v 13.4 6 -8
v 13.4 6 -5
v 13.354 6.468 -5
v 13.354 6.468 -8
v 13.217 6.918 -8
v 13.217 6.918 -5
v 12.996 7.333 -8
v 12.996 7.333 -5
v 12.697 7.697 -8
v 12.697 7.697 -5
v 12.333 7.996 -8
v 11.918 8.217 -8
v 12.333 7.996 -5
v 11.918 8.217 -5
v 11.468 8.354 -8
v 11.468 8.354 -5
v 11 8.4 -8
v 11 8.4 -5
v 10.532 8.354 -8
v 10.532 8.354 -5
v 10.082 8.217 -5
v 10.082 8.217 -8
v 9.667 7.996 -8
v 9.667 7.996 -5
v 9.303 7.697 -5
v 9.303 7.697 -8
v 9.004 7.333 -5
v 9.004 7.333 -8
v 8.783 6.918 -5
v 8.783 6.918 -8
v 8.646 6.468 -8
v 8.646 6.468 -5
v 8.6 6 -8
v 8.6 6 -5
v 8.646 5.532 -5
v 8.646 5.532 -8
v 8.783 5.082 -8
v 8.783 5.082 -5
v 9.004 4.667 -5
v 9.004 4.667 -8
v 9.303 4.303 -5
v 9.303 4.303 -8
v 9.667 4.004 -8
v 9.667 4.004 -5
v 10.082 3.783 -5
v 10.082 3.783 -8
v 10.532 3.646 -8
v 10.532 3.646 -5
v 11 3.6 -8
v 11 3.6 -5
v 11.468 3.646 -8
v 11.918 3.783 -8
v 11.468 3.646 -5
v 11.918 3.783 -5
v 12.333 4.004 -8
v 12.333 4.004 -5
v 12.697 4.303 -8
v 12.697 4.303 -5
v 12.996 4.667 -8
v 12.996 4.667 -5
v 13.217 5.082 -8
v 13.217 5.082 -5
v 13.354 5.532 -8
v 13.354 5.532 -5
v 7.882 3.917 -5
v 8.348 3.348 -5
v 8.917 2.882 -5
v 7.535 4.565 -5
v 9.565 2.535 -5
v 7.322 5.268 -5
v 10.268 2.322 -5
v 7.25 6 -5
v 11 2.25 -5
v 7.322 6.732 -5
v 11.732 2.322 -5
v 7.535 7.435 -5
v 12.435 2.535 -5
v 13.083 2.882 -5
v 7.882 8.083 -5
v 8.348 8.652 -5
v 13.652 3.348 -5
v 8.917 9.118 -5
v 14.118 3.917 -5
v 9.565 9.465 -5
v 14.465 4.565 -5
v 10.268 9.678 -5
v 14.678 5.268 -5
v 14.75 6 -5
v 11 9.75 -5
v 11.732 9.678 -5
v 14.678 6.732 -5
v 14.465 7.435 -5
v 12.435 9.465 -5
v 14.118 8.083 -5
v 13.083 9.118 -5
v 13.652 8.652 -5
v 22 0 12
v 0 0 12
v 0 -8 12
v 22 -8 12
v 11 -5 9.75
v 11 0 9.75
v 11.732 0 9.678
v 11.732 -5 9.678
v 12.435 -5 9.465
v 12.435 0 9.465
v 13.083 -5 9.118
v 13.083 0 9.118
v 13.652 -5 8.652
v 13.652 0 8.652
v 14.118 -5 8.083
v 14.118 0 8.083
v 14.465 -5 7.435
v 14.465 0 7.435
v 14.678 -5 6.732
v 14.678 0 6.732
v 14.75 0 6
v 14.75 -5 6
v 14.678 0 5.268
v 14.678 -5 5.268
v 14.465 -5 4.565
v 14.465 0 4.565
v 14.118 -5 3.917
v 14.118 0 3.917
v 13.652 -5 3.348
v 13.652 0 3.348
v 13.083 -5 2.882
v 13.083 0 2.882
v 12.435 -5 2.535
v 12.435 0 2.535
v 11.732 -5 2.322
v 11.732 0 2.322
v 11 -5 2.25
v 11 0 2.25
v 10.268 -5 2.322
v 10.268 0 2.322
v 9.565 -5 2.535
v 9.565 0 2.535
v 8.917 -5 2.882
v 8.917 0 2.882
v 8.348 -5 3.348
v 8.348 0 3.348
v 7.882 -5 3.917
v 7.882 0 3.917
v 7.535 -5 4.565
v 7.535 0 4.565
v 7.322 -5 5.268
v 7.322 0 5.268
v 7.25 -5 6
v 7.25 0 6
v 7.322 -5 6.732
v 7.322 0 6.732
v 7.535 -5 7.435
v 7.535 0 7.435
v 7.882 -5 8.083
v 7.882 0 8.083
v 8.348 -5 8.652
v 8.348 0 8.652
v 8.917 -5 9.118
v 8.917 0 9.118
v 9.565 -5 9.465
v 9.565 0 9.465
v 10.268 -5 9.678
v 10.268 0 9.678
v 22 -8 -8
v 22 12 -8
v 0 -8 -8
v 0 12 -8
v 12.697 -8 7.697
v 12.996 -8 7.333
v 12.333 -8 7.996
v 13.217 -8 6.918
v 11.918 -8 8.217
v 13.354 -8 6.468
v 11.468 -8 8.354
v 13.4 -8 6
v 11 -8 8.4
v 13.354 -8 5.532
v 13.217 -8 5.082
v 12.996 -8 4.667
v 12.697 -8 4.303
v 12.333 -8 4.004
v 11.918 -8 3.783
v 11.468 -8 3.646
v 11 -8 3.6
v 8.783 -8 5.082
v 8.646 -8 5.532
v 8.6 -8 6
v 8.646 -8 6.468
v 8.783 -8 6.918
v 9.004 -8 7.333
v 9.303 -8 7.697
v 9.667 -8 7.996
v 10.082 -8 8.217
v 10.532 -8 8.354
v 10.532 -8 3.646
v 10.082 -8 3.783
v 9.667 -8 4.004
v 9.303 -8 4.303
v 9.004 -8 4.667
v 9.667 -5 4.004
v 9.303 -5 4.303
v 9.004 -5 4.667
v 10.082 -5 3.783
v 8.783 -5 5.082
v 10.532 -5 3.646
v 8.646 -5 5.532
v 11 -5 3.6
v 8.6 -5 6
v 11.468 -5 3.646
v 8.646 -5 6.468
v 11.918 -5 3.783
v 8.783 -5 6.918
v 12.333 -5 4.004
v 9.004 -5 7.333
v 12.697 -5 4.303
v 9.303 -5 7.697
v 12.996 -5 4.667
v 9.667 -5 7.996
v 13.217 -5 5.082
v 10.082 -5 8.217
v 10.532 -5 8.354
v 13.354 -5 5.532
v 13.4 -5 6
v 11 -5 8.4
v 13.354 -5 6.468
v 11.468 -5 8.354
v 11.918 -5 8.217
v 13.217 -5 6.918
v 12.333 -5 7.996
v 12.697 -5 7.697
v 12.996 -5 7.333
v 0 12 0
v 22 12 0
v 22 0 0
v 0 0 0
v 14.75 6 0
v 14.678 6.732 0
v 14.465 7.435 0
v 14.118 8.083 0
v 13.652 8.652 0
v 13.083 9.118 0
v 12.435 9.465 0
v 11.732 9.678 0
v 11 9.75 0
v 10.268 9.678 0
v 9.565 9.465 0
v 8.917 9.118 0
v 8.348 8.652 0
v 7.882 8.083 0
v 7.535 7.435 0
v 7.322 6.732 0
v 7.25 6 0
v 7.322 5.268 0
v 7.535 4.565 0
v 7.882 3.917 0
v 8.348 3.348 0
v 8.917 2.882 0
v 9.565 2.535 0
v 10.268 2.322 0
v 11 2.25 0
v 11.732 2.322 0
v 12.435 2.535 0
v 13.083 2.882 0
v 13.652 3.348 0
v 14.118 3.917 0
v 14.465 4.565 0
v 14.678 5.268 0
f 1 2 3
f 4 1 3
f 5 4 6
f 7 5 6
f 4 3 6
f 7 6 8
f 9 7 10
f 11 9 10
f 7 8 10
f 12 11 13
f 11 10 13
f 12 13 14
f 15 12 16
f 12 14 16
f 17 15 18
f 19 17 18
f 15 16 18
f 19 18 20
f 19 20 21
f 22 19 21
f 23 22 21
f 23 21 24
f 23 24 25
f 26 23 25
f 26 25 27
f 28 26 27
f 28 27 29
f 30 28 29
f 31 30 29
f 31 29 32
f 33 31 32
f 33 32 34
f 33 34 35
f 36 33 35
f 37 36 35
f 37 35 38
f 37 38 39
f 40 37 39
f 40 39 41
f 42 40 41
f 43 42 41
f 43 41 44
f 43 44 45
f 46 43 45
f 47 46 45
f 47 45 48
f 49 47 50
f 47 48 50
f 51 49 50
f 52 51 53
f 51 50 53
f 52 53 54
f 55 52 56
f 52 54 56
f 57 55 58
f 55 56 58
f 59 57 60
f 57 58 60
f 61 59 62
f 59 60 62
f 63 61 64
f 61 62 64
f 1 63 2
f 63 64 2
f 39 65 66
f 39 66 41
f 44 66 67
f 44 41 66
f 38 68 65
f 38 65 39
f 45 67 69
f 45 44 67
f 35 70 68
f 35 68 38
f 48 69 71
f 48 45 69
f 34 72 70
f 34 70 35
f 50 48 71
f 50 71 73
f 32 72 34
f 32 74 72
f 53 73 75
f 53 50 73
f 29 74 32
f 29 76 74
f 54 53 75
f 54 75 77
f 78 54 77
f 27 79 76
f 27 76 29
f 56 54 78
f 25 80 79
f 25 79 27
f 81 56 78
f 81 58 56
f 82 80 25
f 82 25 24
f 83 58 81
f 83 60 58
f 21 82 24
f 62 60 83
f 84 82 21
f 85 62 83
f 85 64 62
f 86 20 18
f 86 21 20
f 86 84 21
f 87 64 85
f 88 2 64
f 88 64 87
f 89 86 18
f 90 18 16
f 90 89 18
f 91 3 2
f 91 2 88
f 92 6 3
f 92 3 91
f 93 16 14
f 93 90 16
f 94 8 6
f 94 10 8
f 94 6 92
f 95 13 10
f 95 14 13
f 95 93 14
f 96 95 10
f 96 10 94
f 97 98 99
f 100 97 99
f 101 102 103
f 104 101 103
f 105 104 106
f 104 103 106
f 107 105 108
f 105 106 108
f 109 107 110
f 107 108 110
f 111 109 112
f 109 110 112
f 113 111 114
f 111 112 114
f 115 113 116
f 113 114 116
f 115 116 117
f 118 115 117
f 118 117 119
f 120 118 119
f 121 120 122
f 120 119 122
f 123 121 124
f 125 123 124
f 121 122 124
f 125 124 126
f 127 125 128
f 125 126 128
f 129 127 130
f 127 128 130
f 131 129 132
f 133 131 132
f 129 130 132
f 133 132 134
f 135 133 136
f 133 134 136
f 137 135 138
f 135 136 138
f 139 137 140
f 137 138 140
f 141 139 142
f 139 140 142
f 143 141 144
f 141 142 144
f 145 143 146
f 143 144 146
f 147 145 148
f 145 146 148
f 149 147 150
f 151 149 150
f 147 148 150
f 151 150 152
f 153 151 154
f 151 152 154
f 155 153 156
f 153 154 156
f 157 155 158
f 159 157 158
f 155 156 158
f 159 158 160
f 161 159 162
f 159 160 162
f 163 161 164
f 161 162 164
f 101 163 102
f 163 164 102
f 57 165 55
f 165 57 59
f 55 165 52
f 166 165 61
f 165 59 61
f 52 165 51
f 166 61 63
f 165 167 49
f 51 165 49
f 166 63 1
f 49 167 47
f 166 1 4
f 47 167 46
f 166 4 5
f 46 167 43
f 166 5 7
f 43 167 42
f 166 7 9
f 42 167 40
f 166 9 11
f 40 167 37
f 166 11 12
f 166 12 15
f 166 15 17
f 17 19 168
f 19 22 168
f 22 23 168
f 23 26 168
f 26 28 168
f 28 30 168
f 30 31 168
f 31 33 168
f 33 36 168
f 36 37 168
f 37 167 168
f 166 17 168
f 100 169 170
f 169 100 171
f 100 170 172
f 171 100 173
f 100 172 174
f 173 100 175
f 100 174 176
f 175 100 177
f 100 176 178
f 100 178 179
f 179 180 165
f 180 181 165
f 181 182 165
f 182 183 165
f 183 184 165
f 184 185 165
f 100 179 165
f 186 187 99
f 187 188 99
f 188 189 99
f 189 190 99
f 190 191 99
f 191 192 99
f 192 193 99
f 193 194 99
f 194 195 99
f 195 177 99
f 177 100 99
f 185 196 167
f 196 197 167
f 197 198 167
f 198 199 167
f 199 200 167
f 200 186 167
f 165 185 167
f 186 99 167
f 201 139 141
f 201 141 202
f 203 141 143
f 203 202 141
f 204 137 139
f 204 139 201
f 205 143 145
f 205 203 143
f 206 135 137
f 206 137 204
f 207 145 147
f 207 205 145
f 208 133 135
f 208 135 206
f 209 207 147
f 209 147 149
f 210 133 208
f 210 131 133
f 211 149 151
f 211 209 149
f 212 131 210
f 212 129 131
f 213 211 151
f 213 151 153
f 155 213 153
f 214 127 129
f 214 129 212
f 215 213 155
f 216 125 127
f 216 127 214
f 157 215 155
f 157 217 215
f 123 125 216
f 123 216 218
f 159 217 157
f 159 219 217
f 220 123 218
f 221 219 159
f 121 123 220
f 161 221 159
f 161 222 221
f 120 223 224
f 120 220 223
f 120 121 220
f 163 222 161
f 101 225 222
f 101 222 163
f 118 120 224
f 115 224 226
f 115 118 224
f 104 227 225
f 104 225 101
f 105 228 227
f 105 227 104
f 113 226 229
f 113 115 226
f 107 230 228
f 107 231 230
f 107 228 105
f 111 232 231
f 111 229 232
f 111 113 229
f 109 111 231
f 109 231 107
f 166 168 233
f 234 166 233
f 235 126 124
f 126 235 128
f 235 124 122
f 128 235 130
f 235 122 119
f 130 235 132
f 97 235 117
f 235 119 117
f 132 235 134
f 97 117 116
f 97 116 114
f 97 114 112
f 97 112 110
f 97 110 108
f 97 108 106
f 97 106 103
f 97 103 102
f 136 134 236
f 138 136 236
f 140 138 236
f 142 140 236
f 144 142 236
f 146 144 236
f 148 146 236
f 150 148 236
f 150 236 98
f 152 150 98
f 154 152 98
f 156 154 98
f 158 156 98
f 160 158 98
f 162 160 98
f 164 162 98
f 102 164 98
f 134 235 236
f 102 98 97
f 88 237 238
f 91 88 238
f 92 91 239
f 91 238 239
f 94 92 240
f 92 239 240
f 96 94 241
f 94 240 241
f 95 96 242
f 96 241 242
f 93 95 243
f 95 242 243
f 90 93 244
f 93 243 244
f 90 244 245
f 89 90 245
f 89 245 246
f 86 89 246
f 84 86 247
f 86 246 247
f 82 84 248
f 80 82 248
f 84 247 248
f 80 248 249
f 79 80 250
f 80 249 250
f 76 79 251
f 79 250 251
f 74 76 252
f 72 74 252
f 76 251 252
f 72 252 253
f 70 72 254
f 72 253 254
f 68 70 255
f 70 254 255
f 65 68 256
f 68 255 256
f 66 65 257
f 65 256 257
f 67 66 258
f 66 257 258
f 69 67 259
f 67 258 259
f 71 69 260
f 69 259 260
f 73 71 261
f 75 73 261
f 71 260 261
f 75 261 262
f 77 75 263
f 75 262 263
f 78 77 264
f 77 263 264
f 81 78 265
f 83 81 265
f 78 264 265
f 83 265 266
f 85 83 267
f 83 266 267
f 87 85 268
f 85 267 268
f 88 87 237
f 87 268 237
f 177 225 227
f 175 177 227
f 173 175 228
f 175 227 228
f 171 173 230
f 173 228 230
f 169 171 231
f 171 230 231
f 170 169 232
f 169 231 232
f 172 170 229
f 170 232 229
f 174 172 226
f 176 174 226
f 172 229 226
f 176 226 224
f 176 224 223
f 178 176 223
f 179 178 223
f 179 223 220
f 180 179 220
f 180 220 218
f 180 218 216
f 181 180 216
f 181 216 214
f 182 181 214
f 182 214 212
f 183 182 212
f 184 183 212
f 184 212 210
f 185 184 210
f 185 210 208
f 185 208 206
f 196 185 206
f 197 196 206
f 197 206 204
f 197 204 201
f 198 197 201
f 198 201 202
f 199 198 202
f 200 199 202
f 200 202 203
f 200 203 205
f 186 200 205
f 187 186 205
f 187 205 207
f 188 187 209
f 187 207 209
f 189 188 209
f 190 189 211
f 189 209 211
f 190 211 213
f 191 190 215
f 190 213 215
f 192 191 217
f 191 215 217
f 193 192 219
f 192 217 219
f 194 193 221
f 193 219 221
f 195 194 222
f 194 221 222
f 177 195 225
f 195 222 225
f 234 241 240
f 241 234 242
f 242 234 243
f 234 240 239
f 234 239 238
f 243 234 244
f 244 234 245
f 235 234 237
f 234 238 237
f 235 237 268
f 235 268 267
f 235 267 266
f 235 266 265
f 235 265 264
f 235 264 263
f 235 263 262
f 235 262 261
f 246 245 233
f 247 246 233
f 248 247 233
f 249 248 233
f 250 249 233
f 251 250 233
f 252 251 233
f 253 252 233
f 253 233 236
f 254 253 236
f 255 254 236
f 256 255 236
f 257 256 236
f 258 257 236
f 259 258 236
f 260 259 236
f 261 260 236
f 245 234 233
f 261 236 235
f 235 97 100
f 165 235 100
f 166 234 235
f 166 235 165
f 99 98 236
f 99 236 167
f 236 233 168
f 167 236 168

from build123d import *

# Parameters (mm, degrees)
BOSS_EXTRUDE1_DEPTH = 22
SKETCH2_R           = 3.75
CUT_EXTRUDE1_DEPTH  = 5
SKETCH3_R           = 2.4
CUT_EXTRUDE2_DEPTH  = 5
SKETCH4_R           = 3.75
CUT_EXTRUDE3_DEPTH  = 5
SKETCH5_R           = 2.4
CUT_EXTRUDE4_DEPTH  = 5


with BuildPart() as part:
    # Sketch1 → Boss-Extrude1 (new body)
    with BuildSketch(Plane(origin=(0, 0, 0), x_dir=(0, 0, -1), z_dir=(1, 0, 0))):
        Polygon((0, 0), (-12, 0), (-12, -8), (8, -8), (8, 12), (0, 12), align=None)
    extrude(amount=BOSS_EXTRUDE1_DEPTH)

    # Sketch2 → Cut-Extrude1 (cut)
    with BuildSketch(Plane.XY):
        with Locations((11, 6)):
            Circle(SKETCH2_R)
    extrude(amount=-CUT_EXTRUDE1_DEPTH, mode=Mode.SUBTRACT)

    # Sketch3 → Cut-Extrude2 (cut)
    with BuildSketch(Plane.XY.offset(-5)):
        with Locations((11, 6)):
            Circle(SKETCH3_R)
    extrude(amount=-CUT_EXTRUDE2_DEPTH, mode=Mode.SUBTRACT)

    # Sketch4 → Cut-Extrude3 (cut)
    with BuildSketch(Plane(origin=(0, 0, 0), x_dir=(1, 0, 0), z_dir=(0, 1, 0))):
        with Locations((11, -6)):
            Circle(SKETCH4_R)
    extrude(amount=-CUT_EXTRUDE3_DEPTH, mode=Mode.SUBTRACT)

    # Sketch5 → Cut-Extrude4 (cut)
    with BuildSketch(Plane(origin=(0, -5, 0), x_dir=(1, 0, 0), z_dir=(0, 1, 0))):
        with Locations((11, -6)):
            Circle(SKETCH5_R)
    extrude(amount=-CUT_EXTRUDE4_DEPTH, mode=Mode.SUBTRACT)


solid = part.part
